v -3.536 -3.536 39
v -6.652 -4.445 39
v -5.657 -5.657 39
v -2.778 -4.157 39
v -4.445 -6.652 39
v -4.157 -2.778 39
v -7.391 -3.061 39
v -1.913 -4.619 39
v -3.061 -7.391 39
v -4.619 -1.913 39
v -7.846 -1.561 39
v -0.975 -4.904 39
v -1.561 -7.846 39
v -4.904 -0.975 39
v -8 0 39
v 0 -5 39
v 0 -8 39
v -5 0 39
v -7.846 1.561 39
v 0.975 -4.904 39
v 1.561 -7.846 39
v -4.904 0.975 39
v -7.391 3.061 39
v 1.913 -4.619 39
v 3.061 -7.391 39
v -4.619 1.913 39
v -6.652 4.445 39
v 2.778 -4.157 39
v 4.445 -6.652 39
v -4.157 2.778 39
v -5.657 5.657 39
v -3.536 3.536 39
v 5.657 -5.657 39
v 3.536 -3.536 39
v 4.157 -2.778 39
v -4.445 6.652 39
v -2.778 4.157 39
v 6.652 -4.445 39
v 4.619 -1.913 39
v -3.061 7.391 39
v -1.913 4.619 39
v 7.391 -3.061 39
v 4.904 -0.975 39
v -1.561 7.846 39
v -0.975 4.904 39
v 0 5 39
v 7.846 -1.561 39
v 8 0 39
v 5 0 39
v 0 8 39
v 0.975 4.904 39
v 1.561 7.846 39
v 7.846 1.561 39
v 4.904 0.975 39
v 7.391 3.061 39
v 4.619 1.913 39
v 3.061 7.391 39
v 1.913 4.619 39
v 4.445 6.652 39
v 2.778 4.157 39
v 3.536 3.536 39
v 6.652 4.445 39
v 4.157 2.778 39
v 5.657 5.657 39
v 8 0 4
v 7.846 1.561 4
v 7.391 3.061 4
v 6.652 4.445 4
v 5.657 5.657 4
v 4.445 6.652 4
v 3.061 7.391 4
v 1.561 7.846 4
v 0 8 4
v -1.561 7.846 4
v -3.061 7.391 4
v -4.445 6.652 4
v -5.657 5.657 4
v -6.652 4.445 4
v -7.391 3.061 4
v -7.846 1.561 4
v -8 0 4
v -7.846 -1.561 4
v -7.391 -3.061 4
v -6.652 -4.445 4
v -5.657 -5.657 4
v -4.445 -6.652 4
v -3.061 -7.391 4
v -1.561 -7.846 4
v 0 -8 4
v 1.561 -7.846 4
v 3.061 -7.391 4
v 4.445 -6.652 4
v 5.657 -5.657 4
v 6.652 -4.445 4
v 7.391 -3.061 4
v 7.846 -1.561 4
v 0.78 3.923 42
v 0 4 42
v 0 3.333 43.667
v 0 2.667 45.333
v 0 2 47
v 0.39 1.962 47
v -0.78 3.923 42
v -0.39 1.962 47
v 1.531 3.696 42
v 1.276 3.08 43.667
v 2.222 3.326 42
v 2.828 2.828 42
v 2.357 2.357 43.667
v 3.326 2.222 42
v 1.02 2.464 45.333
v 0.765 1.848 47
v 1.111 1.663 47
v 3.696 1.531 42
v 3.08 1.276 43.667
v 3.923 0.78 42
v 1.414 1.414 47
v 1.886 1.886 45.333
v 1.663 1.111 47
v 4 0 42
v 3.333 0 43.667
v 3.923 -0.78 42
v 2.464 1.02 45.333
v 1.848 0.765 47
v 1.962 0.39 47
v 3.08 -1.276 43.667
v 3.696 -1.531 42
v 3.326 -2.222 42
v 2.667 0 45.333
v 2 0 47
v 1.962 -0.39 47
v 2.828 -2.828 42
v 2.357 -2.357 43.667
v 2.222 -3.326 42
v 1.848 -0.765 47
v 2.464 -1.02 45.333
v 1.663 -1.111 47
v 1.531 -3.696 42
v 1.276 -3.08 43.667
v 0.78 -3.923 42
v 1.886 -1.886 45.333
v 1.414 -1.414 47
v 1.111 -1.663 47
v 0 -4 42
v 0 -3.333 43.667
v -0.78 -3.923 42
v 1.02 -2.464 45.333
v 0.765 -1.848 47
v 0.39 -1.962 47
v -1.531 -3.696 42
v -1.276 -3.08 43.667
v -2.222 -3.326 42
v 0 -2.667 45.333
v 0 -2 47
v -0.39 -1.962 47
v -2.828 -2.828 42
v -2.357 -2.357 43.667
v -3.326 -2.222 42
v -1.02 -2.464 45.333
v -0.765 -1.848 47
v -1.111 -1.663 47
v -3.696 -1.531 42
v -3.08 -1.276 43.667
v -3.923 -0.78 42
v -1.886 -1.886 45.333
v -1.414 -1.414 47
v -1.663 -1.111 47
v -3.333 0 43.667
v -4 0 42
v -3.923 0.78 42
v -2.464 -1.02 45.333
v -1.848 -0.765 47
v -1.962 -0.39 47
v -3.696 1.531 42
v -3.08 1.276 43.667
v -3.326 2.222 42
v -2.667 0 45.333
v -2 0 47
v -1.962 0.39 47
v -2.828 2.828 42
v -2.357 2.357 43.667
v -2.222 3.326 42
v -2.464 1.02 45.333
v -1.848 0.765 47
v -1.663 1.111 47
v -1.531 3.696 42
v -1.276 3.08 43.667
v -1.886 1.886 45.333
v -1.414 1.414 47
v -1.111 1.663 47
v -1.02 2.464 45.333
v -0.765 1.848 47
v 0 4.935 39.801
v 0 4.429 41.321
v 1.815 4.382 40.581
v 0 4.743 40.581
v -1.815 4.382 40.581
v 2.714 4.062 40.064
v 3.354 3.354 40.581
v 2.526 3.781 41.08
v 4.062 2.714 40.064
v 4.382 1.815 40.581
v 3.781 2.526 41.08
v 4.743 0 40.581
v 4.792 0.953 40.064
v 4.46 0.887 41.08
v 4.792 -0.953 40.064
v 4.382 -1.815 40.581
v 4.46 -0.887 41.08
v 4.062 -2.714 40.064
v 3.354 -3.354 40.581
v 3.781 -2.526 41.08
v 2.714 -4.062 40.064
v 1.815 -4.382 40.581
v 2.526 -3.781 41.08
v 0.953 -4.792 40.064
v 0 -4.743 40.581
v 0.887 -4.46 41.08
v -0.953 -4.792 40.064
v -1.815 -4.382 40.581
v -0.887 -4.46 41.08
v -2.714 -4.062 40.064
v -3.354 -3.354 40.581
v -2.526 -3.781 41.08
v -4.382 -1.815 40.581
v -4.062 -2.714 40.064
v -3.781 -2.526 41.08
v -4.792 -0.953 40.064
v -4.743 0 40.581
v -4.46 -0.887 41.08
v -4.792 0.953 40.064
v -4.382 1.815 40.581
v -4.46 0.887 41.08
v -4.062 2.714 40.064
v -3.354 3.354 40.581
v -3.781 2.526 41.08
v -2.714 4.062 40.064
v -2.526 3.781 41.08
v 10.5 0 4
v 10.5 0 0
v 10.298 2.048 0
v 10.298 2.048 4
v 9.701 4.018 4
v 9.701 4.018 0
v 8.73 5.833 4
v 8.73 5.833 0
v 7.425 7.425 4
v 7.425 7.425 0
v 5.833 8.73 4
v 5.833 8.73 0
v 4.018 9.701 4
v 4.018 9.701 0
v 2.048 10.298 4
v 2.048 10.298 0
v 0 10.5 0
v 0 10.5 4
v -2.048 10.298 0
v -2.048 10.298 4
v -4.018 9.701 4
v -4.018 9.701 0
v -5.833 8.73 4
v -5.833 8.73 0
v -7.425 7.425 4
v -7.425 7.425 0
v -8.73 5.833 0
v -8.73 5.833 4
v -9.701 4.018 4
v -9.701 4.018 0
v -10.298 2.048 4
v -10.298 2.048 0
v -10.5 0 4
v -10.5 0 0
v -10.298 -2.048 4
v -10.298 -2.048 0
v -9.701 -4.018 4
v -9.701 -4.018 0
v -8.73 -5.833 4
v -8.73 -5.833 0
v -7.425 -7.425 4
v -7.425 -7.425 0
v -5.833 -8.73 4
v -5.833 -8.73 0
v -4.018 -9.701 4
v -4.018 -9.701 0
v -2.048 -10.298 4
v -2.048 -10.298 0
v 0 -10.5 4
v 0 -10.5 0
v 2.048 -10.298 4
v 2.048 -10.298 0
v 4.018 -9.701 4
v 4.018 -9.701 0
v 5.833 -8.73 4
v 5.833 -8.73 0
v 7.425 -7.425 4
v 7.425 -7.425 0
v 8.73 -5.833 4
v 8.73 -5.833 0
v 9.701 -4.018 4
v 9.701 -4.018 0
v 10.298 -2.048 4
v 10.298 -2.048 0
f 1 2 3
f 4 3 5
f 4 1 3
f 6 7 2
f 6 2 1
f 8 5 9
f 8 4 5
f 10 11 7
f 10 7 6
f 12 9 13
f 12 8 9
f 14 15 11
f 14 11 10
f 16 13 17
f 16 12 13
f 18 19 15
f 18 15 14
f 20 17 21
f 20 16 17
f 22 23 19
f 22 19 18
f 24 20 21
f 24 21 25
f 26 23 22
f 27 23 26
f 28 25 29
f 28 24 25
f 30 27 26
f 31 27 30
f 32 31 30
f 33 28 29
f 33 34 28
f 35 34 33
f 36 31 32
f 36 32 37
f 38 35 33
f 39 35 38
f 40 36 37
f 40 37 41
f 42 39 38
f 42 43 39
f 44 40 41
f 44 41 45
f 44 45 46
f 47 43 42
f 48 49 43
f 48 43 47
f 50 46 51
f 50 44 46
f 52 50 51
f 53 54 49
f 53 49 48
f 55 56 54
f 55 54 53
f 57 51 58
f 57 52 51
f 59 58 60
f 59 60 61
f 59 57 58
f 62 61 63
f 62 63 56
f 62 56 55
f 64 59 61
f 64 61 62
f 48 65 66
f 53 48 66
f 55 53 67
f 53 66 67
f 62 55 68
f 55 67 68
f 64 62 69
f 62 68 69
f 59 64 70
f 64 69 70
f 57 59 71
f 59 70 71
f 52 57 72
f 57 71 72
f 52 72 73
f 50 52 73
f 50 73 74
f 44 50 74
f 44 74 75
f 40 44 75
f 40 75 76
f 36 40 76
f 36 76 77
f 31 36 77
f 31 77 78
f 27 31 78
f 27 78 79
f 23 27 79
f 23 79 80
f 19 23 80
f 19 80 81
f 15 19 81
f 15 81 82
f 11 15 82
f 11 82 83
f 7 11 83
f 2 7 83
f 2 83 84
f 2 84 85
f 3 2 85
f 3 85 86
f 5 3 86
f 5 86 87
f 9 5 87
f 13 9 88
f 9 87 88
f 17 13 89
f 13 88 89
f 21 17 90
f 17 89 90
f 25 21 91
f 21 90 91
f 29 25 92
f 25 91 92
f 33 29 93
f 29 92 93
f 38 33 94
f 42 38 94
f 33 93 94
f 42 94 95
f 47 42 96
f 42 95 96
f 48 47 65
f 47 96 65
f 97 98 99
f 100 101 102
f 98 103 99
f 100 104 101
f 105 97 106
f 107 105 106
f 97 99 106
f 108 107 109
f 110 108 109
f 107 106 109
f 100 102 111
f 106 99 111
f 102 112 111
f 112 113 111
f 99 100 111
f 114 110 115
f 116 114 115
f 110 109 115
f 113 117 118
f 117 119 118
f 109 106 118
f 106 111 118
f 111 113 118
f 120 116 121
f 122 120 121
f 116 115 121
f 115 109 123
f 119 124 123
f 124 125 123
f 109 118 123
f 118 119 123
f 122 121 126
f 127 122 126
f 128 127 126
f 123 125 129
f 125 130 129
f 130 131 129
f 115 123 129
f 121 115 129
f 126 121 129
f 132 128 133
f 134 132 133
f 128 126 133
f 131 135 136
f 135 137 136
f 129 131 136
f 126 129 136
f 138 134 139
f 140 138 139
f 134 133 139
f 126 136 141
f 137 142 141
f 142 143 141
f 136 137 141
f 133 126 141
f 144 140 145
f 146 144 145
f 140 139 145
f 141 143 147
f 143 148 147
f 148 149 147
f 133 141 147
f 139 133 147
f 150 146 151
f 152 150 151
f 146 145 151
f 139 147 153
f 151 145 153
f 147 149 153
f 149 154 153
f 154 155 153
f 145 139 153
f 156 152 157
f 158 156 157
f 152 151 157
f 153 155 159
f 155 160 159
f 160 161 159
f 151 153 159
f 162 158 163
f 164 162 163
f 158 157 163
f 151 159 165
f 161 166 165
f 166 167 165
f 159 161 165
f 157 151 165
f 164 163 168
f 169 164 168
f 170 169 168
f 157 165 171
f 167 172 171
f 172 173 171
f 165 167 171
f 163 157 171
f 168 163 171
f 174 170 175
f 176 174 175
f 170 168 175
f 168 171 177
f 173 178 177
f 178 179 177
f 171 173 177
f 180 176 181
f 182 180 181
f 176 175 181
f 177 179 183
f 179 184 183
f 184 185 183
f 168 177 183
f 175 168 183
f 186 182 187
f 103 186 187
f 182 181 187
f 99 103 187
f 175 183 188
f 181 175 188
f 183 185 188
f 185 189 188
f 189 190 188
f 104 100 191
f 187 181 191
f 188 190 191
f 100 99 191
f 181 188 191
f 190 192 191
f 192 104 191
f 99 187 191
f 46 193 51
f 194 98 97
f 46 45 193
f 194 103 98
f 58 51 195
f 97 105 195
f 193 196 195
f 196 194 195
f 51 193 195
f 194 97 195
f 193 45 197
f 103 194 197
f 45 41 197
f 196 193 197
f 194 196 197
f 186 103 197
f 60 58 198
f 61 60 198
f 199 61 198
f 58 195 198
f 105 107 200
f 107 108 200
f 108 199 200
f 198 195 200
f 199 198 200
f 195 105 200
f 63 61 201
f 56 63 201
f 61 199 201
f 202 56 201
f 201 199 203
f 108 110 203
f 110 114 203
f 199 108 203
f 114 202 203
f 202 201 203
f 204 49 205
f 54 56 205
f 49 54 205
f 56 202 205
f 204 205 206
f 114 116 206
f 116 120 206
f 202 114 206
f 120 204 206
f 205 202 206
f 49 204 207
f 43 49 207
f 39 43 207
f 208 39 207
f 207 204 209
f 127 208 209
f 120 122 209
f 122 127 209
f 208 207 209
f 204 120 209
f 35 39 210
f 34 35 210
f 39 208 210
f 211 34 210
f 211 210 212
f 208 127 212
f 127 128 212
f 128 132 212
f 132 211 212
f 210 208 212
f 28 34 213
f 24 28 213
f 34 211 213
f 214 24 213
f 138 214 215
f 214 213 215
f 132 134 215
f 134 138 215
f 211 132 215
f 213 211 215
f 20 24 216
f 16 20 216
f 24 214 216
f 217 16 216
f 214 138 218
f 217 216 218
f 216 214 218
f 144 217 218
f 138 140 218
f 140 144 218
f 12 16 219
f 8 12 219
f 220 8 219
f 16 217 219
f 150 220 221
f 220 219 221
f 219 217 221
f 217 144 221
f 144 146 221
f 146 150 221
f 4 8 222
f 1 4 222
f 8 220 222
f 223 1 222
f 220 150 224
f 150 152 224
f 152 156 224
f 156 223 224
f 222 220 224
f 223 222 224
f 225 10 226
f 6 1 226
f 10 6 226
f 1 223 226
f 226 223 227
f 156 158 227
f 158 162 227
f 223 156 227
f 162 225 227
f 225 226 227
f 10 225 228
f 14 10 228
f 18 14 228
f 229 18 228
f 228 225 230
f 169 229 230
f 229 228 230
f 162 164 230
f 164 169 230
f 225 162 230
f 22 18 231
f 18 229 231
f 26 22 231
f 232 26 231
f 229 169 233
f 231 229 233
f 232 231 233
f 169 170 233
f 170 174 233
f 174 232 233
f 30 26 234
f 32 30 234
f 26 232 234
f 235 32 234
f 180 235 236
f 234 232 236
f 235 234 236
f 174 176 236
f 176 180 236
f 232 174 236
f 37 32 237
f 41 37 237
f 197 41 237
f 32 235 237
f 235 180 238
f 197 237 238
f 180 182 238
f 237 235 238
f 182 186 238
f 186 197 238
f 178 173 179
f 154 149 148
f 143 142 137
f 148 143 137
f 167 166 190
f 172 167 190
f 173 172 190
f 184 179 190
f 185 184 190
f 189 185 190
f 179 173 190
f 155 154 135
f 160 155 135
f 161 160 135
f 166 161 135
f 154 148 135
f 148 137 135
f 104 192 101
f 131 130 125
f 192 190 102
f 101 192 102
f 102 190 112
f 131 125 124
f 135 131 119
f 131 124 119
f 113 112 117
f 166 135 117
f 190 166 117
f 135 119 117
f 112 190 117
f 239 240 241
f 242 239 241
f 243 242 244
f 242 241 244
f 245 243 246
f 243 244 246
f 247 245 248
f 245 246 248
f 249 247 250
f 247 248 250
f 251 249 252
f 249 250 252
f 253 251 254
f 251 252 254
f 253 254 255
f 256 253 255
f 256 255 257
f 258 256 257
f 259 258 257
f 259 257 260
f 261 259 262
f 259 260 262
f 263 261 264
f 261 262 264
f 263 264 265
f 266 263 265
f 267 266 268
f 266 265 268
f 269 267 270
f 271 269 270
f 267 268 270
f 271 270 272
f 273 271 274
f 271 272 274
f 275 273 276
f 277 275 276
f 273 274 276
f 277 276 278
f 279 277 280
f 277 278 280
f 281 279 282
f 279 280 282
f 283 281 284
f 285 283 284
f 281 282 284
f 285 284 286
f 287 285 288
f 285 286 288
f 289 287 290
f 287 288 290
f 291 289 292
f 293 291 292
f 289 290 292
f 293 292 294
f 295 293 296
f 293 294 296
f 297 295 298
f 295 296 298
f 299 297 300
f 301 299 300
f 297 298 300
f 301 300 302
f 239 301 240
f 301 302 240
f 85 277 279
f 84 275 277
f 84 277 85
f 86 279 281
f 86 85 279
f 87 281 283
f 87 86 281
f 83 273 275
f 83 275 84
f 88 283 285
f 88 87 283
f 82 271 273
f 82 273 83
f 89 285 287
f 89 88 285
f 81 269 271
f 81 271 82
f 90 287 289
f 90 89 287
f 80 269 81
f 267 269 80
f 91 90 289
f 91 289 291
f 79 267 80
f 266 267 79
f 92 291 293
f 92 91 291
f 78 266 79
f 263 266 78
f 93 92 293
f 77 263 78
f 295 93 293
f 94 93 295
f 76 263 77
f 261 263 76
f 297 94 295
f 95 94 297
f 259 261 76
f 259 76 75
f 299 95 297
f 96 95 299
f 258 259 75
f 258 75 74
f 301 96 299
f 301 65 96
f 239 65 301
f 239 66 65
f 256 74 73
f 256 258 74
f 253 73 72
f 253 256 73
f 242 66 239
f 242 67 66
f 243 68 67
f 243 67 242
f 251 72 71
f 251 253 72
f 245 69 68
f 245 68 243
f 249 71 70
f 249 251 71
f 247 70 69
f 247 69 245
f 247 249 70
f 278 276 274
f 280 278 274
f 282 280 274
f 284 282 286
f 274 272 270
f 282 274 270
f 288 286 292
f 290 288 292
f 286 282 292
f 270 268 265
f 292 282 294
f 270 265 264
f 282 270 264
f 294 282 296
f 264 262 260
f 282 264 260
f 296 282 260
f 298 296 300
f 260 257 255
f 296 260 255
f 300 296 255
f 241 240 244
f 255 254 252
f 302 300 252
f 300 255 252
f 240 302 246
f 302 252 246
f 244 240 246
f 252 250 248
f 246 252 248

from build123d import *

# Parameters (mm, degrees)
F0_R     = 10.5
F1_DEPTH = 4
F2_R     = 8
F3_DEPTH = 39


with BuildPart() as f1:
    # F0 (on Top) → F1 (new body)
    with BuildSketch(Plane.XY):
        Circle(F0_R)
    extrude(amount=F1_DEPTH)

    # F2 (on Top) → F3 (join)
    with BuildSketch(Plane.XY):
        Circle(F2_R)
    extrude(amount=F3_DEPTH)

    # F4 (on Right) → F5 (revolve)
    with BuildSketch(Plane.YZ):
        with BuildLine():
            Line((4, 42), (0, 42))
            Line((0, 42), (0, 39))
            Line((0, 39), (5, 39))
            ThreePointArc((5, 39), (4.743416, 40.581139), (4, 42))
        make_face()
        with BuildLine():
            Line((0, 47), (0, 44))
            ThreePointArc((0, 44), (2.236068, 43.472136), (4, 42))
            Line((4, 42), (2, 47))
            Line((2, 47), (0, 47))
        make_face()
        with BuildLine():
            ThreePointArc((4, 42), (2.236068, 43.472136), (0, 44))
            Line((0, 44), (0, 42))
            Line((0, 42), (4, 42))
        make_face()
    revolve(axis=Axis((0, 0, 41.5), (0, 0, -1)))


solid = f1.part
